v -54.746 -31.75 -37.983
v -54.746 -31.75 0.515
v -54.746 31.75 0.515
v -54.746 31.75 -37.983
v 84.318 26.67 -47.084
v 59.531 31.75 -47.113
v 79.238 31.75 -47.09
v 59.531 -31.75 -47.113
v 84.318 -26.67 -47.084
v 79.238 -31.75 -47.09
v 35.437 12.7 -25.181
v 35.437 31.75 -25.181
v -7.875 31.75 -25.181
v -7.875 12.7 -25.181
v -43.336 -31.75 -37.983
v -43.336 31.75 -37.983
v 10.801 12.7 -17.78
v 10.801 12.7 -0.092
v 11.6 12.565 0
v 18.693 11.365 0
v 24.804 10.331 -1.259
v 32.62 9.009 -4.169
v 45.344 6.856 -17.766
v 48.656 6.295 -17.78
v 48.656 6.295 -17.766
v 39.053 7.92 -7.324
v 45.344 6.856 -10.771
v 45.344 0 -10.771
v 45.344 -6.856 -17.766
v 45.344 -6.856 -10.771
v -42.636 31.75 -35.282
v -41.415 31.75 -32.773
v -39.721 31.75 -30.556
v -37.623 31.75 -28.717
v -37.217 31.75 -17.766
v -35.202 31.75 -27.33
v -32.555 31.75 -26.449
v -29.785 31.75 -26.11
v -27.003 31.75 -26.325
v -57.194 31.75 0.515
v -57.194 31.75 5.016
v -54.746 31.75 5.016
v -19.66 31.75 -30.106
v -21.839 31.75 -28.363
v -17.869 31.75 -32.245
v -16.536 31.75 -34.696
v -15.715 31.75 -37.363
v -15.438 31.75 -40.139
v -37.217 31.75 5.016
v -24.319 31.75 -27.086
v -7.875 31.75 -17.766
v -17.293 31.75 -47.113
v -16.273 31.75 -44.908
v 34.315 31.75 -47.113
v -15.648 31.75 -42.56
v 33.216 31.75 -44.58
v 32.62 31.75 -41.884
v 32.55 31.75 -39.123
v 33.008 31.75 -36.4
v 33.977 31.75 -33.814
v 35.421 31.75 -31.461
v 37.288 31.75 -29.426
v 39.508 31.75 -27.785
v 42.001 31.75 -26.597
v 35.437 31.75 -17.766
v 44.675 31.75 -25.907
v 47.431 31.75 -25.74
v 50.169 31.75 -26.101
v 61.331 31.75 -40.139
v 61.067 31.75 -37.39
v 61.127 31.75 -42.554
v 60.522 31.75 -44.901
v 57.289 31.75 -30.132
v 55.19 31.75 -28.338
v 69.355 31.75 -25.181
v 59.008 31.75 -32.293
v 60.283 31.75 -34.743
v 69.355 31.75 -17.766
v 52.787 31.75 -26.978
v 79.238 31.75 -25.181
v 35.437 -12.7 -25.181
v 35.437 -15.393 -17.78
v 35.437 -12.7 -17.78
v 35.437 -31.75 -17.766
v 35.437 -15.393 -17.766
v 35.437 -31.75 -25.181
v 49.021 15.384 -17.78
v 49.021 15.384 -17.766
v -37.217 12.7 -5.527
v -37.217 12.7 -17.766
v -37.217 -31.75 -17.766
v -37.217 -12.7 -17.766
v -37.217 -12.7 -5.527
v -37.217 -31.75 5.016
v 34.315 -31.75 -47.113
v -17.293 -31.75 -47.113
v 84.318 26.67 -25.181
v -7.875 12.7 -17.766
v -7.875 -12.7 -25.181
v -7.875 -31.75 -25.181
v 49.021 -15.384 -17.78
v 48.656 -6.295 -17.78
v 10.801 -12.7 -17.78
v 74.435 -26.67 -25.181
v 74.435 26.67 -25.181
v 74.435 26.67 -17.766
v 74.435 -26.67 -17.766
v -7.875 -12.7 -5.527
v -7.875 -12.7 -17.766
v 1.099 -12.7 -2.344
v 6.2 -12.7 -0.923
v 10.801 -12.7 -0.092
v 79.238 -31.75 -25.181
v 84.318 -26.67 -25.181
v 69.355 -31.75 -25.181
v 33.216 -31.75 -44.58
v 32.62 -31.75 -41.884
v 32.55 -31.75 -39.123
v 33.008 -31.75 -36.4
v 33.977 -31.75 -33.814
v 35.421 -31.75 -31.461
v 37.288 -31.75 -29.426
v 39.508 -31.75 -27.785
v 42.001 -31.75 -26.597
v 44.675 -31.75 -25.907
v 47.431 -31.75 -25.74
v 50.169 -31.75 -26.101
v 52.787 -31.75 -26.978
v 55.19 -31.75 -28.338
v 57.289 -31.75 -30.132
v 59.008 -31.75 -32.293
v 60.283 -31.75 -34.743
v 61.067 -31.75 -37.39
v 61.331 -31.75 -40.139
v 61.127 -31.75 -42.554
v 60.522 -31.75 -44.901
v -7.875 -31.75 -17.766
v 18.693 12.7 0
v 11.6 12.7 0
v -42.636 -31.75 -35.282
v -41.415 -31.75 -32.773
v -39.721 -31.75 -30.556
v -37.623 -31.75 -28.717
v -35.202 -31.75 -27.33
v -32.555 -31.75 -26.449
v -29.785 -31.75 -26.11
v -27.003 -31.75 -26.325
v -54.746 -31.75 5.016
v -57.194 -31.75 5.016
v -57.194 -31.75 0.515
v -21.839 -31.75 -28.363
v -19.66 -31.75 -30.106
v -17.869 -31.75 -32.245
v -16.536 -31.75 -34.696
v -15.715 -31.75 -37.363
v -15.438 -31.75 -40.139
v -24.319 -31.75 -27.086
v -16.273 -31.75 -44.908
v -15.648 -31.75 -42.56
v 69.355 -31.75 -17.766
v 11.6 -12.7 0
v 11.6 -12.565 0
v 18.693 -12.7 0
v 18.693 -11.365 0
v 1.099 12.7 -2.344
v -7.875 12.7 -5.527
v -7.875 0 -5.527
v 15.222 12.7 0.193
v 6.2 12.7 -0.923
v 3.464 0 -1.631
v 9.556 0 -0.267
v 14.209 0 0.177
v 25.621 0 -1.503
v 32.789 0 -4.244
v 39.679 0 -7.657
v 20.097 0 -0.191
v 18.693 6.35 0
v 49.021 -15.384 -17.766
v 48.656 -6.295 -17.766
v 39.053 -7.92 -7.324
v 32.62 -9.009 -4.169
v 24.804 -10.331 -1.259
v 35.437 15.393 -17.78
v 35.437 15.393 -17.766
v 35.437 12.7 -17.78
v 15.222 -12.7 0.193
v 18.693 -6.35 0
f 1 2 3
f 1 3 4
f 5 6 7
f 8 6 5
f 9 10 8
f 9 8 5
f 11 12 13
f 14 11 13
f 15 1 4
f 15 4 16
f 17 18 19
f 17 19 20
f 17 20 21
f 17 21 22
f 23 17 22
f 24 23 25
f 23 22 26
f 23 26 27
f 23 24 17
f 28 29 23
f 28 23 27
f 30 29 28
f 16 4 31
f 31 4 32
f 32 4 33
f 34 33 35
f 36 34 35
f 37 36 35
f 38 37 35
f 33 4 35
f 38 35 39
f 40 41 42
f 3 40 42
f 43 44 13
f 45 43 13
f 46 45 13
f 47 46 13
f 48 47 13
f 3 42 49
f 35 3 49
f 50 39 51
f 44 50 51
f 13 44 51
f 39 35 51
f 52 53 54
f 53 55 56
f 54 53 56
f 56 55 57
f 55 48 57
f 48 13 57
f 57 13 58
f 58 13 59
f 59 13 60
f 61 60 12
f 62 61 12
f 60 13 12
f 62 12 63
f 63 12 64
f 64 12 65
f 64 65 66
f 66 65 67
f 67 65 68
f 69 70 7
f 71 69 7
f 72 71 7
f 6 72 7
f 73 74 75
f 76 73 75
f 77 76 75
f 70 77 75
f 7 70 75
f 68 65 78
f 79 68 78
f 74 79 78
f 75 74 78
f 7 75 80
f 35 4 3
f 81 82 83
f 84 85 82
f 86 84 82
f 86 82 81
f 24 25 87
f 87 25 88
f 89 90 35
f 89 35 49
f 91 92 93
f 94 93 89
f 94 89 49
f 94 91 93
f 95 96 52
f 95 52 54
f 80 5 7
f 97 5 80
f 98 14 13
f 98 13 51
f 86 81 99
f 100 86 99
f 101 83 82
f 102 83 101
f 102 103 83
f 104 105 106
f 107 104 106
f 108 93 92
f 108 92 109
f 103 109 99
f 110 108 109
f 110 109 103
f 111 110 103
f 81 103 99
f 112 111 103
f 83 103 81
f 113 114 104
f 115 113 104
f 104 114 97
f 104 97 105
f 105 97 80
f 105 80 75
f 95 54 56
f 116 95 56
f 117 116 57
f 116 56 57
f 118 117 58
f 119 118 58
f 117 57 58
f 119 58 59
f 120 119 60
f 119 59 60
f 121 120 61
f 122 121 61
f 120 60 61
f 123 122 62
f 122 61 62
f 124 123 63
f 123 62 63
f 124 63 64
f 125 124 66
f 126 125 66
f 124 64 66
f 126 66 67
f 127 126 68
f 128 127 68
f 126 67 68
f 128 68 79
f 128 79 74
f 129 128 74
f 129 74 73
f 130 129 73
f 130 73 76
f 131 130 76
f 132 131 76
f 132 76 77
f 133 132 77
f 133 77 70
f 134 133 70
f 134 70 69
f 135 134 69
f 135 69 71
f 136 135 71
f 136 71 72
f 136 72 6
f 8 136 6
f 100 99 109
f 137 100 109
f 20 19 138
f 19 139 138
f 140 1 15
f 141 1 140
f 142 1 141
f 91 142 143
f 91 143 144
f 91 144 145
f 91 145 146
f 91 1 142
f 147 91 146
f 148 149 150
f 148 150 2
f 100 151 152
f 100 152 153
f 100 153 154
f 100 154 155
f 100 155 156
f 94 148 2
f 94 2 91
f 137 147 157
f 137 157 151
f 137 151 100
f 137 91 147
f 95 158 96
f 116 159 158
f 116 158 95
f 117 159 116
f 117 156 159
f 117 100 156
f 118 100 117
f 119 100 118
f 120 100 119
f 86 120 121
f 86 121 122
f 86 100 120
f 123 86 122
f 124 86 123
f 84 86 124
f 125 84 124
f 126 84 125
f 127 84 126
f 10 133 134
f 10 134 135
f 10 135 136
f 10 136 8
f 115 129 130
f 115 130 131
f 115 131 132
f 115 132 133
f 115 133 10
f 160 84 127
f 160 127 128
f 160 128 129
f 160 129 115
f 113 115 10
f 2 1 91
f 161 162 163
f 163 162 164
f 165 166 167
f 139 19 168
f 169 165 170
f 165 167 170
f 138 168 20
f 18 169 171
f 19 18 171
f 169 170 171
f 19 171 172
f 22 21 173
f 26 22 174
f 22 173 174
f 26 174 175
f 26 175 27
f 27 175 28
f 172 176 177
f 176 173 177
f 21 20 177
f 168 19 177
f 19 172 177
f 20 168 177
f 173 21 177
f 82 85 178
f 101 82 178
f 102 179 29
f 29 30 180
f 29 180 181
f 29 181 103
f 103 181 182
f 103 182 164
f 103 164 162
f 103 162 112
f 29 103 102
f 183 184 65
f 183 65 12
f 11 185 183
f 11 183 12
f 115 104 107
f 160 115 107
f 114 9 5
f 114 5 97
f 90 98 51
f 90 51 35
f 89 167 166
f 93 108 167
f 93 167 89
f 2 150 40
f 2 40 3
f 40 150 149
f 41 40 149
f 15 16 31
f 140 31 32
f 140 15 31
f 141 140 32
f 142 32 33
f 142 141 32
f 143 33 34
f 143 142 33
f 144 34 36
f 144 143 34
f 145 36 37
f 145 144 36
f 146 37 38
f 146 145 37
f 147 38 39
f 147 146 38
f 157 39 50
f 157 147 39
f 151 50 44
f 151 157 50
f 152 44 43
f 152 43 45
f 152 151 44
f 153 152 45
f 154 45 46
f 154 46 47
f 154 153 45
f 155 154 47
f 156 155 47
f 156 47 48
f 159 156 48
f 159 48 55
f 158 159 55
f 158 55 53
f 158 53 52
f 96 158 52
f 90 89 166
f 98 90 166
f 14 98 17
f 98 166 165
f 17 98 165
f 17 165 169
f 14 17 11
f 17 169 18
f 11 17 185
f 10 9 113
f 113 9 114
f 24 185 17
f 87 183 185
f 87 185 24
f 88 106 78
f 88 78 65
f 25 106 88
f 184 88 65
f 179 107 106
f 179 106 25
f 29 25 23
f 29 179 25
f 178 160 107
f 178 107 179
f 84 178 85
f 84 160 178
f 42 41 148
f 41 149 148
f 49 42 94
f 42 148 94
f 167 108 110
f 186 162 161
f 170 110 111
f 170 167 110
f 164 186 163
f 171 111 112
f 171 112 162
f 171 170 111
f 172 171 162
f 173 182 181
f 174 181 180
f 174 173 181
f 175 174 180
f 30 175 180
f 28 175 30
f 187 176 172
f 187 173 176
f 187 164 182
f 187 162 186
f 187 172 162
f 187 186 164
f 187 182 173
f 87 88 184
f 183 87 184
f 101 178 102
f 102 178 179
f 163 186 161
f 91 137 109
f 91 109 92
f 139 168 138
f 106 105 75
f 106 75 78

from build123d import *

# Parameters (mm, degrees)
F1_DEPTH = 31.75
F2_DEPTH = 12.7
F3_DEPTH = 12.7
F0_W     = 2.4479581043
F0_H     = 4.5006387227
F4_DEPTH = 31.75
F5_SIZE  = 5.08
F7_DEPTH = 17.78


with BuildPart() as f1:
    # F0 (on Front) → F1 (new body, symmetric)
    with BuildSketch(Plane.XZ):
        with BuildLine():
            Line((-37.2165674344, 5.0159874372), (-54.7461742535, 5.0159874372))
            Line((-54.7461742535, 5.0159874372), (-54.7461742535, 0.5153487145))
            Line((-54.7461742535, 0.5153487145), (-54.7461742535, -37.9826184362))
            Line((-54.7461742535, -37.9826184362), (-43.3364818902, -37.9826184362))
            ThreePointArc((-43.3364818902, -37.9826184362), (-28.3889674357, -26.1480412328), (-15.4376497281, -40.1390660554))
            ThreePointArc((-15.4376497281, -40.1390660554), (-15.9095240894, -43.7474911576), (-17.2934120834, -47.1132379025))
            Line((-17.2934120834, -47.1132379025), (34.3146193156, -47.1132379025))
            ThreePointArc((34.3146193156, -47.1132379025), (43.3213433173, -26.1879454869), (61.3312065818, -40.1390660554))
            ThreePointArc((61.3312065818, -40.1390660554), (60.8738629577, -43.7404651272), (59.5308654627, -47.1132379025))
            Line((59.5308654627, -47.1132379025), (84.3179924414, -47.0838975161))
            Line((84.3179924414, -47.0838975161), (84.3179924414, -25.180962868))
            Line((84.3179924414, -25.180962868), (74.4349635206, -25.180962868))
            Line((74.4349635206, -25.180962868), (74.4349635206, -17.7660211921))
            Line((74.4349635206, -17.7660211921), (45.3435182571, -17.7660211921))
            Line((45.3435182571, -17.7660211921), (35.4370600544, -17.7660211921))
            Line((35.4370600544, -17.7660211921), (35.4370600544, -25.180962868))
            Line((35.4370600544, -25.180962868), (-7.8752368445, -25.180962868))
            Line((-7.8752368445, -25.180962868), (-7.8752368445, -17.7660211921))
            Line((-7.8752368445, -17.7660211921), (-37.2165674344, -17.7660211921))
            Line((-37.2165674344, -17.7660211921), (-37.2165674344, -5.5272214778))
            Line((-37.2165674344, -5.5272214778), (-37.2165674344, 5.0159874372))
        make_face()
    extrude(amount=F1_DEPTH, both=True)

    # F0 (on Front) → F2 (join, symmetric)
    with BuildSketch(Plane.XZ):
        with BuildLine():
            add(Edge.make_bspline(
                [(-7.8752368445, -5.5272214778), (0.0340392295, -2.6463832002), (18.3779976424, 4.9271584445), (39.107106626, -7.3388037272), (45.3435182571, -10.7714328915)],
                knots=[0, 0, 0, 0, 0.4928089492, 1, 1, 1, 1], degree=3))
            Line((-7.8752368445, -5.5272214778), (-7.8752368445, -14.7637212649))
            Line((-7.8752368445, -14.7637212649), (-7.8752368445, -17.7660211921))
            Line((-7.8752368445, -17.7660211921), (-7.8752368445, -25.180962868))
            Line((-7.8752368445, -25.180962868), (35.4370600544, -25.180962868))
            Line((35.4370600544, -25.180962868), (35.4370600544, -17.7660211921))
            Line((35.4370600544, -17.7660211921), (45.3435182571, -17.7660211921))
            Line((45.3435182571, -17.7660211921), (45.3435182571, -10.7714328915))
        make_face()
    extrude(amount=F2_DEPTH, both=True)

    # F0 (on Front) → F3 (join, symmetric)
    with BuildSketch(Plane.XZ):
        Polygon((-7.8752368445, -5.5272214778), (-37.2165674344, -5.5272214778), (-37.2165674344, -17.7660211921), (-7.8752368445, -17.7660211921), (-7.8752368445, -14.7637212649), align=None)
    extrude(amount=F3_DEPTH, both=True)

    # F0 (on Front) → F4 (join, symmetric)
    with BuildSketch(Plane.XZ):
        with Locations((-55.9701533057, 2.7656680759)):
            Rectangle(F0_W, F0_H)
    extrude(amount=F4_DEPTH, both=True)

    # F5
    f5_edges = [f1.edges().sort_by_distance(p)[0] for p in [
        (74.434964, -31.75, -21.473492),
        (74.434964, 31.75, -21.473492),
        (84.317992, 31.75, -36.13243),
        (84.317992, -31.75, -36.13243),
    ]]
    chamfer(f5_edges, length=F5_SIZE)

    # F6 (on Top) → F7 (cut)
    with BuildSketch(Plane.XY):
        Polygon((7.4531887515, -13.2663722182), (7.5393404698, -15.4116023798), (49.021124661, -15.384102137), (48.6561246216, -6.2953792512), align=None)
        Polygon((48.6561246216, 6.2953792512), (49.021124661, 15.384102137), (7.5393404698, 15.4116023798), (7.4531887515, 13.2663722182), align=None)
    extrude(amount=-F7_DEPTH, mode=Mode.SUBTRACT)


solid = f1.part
